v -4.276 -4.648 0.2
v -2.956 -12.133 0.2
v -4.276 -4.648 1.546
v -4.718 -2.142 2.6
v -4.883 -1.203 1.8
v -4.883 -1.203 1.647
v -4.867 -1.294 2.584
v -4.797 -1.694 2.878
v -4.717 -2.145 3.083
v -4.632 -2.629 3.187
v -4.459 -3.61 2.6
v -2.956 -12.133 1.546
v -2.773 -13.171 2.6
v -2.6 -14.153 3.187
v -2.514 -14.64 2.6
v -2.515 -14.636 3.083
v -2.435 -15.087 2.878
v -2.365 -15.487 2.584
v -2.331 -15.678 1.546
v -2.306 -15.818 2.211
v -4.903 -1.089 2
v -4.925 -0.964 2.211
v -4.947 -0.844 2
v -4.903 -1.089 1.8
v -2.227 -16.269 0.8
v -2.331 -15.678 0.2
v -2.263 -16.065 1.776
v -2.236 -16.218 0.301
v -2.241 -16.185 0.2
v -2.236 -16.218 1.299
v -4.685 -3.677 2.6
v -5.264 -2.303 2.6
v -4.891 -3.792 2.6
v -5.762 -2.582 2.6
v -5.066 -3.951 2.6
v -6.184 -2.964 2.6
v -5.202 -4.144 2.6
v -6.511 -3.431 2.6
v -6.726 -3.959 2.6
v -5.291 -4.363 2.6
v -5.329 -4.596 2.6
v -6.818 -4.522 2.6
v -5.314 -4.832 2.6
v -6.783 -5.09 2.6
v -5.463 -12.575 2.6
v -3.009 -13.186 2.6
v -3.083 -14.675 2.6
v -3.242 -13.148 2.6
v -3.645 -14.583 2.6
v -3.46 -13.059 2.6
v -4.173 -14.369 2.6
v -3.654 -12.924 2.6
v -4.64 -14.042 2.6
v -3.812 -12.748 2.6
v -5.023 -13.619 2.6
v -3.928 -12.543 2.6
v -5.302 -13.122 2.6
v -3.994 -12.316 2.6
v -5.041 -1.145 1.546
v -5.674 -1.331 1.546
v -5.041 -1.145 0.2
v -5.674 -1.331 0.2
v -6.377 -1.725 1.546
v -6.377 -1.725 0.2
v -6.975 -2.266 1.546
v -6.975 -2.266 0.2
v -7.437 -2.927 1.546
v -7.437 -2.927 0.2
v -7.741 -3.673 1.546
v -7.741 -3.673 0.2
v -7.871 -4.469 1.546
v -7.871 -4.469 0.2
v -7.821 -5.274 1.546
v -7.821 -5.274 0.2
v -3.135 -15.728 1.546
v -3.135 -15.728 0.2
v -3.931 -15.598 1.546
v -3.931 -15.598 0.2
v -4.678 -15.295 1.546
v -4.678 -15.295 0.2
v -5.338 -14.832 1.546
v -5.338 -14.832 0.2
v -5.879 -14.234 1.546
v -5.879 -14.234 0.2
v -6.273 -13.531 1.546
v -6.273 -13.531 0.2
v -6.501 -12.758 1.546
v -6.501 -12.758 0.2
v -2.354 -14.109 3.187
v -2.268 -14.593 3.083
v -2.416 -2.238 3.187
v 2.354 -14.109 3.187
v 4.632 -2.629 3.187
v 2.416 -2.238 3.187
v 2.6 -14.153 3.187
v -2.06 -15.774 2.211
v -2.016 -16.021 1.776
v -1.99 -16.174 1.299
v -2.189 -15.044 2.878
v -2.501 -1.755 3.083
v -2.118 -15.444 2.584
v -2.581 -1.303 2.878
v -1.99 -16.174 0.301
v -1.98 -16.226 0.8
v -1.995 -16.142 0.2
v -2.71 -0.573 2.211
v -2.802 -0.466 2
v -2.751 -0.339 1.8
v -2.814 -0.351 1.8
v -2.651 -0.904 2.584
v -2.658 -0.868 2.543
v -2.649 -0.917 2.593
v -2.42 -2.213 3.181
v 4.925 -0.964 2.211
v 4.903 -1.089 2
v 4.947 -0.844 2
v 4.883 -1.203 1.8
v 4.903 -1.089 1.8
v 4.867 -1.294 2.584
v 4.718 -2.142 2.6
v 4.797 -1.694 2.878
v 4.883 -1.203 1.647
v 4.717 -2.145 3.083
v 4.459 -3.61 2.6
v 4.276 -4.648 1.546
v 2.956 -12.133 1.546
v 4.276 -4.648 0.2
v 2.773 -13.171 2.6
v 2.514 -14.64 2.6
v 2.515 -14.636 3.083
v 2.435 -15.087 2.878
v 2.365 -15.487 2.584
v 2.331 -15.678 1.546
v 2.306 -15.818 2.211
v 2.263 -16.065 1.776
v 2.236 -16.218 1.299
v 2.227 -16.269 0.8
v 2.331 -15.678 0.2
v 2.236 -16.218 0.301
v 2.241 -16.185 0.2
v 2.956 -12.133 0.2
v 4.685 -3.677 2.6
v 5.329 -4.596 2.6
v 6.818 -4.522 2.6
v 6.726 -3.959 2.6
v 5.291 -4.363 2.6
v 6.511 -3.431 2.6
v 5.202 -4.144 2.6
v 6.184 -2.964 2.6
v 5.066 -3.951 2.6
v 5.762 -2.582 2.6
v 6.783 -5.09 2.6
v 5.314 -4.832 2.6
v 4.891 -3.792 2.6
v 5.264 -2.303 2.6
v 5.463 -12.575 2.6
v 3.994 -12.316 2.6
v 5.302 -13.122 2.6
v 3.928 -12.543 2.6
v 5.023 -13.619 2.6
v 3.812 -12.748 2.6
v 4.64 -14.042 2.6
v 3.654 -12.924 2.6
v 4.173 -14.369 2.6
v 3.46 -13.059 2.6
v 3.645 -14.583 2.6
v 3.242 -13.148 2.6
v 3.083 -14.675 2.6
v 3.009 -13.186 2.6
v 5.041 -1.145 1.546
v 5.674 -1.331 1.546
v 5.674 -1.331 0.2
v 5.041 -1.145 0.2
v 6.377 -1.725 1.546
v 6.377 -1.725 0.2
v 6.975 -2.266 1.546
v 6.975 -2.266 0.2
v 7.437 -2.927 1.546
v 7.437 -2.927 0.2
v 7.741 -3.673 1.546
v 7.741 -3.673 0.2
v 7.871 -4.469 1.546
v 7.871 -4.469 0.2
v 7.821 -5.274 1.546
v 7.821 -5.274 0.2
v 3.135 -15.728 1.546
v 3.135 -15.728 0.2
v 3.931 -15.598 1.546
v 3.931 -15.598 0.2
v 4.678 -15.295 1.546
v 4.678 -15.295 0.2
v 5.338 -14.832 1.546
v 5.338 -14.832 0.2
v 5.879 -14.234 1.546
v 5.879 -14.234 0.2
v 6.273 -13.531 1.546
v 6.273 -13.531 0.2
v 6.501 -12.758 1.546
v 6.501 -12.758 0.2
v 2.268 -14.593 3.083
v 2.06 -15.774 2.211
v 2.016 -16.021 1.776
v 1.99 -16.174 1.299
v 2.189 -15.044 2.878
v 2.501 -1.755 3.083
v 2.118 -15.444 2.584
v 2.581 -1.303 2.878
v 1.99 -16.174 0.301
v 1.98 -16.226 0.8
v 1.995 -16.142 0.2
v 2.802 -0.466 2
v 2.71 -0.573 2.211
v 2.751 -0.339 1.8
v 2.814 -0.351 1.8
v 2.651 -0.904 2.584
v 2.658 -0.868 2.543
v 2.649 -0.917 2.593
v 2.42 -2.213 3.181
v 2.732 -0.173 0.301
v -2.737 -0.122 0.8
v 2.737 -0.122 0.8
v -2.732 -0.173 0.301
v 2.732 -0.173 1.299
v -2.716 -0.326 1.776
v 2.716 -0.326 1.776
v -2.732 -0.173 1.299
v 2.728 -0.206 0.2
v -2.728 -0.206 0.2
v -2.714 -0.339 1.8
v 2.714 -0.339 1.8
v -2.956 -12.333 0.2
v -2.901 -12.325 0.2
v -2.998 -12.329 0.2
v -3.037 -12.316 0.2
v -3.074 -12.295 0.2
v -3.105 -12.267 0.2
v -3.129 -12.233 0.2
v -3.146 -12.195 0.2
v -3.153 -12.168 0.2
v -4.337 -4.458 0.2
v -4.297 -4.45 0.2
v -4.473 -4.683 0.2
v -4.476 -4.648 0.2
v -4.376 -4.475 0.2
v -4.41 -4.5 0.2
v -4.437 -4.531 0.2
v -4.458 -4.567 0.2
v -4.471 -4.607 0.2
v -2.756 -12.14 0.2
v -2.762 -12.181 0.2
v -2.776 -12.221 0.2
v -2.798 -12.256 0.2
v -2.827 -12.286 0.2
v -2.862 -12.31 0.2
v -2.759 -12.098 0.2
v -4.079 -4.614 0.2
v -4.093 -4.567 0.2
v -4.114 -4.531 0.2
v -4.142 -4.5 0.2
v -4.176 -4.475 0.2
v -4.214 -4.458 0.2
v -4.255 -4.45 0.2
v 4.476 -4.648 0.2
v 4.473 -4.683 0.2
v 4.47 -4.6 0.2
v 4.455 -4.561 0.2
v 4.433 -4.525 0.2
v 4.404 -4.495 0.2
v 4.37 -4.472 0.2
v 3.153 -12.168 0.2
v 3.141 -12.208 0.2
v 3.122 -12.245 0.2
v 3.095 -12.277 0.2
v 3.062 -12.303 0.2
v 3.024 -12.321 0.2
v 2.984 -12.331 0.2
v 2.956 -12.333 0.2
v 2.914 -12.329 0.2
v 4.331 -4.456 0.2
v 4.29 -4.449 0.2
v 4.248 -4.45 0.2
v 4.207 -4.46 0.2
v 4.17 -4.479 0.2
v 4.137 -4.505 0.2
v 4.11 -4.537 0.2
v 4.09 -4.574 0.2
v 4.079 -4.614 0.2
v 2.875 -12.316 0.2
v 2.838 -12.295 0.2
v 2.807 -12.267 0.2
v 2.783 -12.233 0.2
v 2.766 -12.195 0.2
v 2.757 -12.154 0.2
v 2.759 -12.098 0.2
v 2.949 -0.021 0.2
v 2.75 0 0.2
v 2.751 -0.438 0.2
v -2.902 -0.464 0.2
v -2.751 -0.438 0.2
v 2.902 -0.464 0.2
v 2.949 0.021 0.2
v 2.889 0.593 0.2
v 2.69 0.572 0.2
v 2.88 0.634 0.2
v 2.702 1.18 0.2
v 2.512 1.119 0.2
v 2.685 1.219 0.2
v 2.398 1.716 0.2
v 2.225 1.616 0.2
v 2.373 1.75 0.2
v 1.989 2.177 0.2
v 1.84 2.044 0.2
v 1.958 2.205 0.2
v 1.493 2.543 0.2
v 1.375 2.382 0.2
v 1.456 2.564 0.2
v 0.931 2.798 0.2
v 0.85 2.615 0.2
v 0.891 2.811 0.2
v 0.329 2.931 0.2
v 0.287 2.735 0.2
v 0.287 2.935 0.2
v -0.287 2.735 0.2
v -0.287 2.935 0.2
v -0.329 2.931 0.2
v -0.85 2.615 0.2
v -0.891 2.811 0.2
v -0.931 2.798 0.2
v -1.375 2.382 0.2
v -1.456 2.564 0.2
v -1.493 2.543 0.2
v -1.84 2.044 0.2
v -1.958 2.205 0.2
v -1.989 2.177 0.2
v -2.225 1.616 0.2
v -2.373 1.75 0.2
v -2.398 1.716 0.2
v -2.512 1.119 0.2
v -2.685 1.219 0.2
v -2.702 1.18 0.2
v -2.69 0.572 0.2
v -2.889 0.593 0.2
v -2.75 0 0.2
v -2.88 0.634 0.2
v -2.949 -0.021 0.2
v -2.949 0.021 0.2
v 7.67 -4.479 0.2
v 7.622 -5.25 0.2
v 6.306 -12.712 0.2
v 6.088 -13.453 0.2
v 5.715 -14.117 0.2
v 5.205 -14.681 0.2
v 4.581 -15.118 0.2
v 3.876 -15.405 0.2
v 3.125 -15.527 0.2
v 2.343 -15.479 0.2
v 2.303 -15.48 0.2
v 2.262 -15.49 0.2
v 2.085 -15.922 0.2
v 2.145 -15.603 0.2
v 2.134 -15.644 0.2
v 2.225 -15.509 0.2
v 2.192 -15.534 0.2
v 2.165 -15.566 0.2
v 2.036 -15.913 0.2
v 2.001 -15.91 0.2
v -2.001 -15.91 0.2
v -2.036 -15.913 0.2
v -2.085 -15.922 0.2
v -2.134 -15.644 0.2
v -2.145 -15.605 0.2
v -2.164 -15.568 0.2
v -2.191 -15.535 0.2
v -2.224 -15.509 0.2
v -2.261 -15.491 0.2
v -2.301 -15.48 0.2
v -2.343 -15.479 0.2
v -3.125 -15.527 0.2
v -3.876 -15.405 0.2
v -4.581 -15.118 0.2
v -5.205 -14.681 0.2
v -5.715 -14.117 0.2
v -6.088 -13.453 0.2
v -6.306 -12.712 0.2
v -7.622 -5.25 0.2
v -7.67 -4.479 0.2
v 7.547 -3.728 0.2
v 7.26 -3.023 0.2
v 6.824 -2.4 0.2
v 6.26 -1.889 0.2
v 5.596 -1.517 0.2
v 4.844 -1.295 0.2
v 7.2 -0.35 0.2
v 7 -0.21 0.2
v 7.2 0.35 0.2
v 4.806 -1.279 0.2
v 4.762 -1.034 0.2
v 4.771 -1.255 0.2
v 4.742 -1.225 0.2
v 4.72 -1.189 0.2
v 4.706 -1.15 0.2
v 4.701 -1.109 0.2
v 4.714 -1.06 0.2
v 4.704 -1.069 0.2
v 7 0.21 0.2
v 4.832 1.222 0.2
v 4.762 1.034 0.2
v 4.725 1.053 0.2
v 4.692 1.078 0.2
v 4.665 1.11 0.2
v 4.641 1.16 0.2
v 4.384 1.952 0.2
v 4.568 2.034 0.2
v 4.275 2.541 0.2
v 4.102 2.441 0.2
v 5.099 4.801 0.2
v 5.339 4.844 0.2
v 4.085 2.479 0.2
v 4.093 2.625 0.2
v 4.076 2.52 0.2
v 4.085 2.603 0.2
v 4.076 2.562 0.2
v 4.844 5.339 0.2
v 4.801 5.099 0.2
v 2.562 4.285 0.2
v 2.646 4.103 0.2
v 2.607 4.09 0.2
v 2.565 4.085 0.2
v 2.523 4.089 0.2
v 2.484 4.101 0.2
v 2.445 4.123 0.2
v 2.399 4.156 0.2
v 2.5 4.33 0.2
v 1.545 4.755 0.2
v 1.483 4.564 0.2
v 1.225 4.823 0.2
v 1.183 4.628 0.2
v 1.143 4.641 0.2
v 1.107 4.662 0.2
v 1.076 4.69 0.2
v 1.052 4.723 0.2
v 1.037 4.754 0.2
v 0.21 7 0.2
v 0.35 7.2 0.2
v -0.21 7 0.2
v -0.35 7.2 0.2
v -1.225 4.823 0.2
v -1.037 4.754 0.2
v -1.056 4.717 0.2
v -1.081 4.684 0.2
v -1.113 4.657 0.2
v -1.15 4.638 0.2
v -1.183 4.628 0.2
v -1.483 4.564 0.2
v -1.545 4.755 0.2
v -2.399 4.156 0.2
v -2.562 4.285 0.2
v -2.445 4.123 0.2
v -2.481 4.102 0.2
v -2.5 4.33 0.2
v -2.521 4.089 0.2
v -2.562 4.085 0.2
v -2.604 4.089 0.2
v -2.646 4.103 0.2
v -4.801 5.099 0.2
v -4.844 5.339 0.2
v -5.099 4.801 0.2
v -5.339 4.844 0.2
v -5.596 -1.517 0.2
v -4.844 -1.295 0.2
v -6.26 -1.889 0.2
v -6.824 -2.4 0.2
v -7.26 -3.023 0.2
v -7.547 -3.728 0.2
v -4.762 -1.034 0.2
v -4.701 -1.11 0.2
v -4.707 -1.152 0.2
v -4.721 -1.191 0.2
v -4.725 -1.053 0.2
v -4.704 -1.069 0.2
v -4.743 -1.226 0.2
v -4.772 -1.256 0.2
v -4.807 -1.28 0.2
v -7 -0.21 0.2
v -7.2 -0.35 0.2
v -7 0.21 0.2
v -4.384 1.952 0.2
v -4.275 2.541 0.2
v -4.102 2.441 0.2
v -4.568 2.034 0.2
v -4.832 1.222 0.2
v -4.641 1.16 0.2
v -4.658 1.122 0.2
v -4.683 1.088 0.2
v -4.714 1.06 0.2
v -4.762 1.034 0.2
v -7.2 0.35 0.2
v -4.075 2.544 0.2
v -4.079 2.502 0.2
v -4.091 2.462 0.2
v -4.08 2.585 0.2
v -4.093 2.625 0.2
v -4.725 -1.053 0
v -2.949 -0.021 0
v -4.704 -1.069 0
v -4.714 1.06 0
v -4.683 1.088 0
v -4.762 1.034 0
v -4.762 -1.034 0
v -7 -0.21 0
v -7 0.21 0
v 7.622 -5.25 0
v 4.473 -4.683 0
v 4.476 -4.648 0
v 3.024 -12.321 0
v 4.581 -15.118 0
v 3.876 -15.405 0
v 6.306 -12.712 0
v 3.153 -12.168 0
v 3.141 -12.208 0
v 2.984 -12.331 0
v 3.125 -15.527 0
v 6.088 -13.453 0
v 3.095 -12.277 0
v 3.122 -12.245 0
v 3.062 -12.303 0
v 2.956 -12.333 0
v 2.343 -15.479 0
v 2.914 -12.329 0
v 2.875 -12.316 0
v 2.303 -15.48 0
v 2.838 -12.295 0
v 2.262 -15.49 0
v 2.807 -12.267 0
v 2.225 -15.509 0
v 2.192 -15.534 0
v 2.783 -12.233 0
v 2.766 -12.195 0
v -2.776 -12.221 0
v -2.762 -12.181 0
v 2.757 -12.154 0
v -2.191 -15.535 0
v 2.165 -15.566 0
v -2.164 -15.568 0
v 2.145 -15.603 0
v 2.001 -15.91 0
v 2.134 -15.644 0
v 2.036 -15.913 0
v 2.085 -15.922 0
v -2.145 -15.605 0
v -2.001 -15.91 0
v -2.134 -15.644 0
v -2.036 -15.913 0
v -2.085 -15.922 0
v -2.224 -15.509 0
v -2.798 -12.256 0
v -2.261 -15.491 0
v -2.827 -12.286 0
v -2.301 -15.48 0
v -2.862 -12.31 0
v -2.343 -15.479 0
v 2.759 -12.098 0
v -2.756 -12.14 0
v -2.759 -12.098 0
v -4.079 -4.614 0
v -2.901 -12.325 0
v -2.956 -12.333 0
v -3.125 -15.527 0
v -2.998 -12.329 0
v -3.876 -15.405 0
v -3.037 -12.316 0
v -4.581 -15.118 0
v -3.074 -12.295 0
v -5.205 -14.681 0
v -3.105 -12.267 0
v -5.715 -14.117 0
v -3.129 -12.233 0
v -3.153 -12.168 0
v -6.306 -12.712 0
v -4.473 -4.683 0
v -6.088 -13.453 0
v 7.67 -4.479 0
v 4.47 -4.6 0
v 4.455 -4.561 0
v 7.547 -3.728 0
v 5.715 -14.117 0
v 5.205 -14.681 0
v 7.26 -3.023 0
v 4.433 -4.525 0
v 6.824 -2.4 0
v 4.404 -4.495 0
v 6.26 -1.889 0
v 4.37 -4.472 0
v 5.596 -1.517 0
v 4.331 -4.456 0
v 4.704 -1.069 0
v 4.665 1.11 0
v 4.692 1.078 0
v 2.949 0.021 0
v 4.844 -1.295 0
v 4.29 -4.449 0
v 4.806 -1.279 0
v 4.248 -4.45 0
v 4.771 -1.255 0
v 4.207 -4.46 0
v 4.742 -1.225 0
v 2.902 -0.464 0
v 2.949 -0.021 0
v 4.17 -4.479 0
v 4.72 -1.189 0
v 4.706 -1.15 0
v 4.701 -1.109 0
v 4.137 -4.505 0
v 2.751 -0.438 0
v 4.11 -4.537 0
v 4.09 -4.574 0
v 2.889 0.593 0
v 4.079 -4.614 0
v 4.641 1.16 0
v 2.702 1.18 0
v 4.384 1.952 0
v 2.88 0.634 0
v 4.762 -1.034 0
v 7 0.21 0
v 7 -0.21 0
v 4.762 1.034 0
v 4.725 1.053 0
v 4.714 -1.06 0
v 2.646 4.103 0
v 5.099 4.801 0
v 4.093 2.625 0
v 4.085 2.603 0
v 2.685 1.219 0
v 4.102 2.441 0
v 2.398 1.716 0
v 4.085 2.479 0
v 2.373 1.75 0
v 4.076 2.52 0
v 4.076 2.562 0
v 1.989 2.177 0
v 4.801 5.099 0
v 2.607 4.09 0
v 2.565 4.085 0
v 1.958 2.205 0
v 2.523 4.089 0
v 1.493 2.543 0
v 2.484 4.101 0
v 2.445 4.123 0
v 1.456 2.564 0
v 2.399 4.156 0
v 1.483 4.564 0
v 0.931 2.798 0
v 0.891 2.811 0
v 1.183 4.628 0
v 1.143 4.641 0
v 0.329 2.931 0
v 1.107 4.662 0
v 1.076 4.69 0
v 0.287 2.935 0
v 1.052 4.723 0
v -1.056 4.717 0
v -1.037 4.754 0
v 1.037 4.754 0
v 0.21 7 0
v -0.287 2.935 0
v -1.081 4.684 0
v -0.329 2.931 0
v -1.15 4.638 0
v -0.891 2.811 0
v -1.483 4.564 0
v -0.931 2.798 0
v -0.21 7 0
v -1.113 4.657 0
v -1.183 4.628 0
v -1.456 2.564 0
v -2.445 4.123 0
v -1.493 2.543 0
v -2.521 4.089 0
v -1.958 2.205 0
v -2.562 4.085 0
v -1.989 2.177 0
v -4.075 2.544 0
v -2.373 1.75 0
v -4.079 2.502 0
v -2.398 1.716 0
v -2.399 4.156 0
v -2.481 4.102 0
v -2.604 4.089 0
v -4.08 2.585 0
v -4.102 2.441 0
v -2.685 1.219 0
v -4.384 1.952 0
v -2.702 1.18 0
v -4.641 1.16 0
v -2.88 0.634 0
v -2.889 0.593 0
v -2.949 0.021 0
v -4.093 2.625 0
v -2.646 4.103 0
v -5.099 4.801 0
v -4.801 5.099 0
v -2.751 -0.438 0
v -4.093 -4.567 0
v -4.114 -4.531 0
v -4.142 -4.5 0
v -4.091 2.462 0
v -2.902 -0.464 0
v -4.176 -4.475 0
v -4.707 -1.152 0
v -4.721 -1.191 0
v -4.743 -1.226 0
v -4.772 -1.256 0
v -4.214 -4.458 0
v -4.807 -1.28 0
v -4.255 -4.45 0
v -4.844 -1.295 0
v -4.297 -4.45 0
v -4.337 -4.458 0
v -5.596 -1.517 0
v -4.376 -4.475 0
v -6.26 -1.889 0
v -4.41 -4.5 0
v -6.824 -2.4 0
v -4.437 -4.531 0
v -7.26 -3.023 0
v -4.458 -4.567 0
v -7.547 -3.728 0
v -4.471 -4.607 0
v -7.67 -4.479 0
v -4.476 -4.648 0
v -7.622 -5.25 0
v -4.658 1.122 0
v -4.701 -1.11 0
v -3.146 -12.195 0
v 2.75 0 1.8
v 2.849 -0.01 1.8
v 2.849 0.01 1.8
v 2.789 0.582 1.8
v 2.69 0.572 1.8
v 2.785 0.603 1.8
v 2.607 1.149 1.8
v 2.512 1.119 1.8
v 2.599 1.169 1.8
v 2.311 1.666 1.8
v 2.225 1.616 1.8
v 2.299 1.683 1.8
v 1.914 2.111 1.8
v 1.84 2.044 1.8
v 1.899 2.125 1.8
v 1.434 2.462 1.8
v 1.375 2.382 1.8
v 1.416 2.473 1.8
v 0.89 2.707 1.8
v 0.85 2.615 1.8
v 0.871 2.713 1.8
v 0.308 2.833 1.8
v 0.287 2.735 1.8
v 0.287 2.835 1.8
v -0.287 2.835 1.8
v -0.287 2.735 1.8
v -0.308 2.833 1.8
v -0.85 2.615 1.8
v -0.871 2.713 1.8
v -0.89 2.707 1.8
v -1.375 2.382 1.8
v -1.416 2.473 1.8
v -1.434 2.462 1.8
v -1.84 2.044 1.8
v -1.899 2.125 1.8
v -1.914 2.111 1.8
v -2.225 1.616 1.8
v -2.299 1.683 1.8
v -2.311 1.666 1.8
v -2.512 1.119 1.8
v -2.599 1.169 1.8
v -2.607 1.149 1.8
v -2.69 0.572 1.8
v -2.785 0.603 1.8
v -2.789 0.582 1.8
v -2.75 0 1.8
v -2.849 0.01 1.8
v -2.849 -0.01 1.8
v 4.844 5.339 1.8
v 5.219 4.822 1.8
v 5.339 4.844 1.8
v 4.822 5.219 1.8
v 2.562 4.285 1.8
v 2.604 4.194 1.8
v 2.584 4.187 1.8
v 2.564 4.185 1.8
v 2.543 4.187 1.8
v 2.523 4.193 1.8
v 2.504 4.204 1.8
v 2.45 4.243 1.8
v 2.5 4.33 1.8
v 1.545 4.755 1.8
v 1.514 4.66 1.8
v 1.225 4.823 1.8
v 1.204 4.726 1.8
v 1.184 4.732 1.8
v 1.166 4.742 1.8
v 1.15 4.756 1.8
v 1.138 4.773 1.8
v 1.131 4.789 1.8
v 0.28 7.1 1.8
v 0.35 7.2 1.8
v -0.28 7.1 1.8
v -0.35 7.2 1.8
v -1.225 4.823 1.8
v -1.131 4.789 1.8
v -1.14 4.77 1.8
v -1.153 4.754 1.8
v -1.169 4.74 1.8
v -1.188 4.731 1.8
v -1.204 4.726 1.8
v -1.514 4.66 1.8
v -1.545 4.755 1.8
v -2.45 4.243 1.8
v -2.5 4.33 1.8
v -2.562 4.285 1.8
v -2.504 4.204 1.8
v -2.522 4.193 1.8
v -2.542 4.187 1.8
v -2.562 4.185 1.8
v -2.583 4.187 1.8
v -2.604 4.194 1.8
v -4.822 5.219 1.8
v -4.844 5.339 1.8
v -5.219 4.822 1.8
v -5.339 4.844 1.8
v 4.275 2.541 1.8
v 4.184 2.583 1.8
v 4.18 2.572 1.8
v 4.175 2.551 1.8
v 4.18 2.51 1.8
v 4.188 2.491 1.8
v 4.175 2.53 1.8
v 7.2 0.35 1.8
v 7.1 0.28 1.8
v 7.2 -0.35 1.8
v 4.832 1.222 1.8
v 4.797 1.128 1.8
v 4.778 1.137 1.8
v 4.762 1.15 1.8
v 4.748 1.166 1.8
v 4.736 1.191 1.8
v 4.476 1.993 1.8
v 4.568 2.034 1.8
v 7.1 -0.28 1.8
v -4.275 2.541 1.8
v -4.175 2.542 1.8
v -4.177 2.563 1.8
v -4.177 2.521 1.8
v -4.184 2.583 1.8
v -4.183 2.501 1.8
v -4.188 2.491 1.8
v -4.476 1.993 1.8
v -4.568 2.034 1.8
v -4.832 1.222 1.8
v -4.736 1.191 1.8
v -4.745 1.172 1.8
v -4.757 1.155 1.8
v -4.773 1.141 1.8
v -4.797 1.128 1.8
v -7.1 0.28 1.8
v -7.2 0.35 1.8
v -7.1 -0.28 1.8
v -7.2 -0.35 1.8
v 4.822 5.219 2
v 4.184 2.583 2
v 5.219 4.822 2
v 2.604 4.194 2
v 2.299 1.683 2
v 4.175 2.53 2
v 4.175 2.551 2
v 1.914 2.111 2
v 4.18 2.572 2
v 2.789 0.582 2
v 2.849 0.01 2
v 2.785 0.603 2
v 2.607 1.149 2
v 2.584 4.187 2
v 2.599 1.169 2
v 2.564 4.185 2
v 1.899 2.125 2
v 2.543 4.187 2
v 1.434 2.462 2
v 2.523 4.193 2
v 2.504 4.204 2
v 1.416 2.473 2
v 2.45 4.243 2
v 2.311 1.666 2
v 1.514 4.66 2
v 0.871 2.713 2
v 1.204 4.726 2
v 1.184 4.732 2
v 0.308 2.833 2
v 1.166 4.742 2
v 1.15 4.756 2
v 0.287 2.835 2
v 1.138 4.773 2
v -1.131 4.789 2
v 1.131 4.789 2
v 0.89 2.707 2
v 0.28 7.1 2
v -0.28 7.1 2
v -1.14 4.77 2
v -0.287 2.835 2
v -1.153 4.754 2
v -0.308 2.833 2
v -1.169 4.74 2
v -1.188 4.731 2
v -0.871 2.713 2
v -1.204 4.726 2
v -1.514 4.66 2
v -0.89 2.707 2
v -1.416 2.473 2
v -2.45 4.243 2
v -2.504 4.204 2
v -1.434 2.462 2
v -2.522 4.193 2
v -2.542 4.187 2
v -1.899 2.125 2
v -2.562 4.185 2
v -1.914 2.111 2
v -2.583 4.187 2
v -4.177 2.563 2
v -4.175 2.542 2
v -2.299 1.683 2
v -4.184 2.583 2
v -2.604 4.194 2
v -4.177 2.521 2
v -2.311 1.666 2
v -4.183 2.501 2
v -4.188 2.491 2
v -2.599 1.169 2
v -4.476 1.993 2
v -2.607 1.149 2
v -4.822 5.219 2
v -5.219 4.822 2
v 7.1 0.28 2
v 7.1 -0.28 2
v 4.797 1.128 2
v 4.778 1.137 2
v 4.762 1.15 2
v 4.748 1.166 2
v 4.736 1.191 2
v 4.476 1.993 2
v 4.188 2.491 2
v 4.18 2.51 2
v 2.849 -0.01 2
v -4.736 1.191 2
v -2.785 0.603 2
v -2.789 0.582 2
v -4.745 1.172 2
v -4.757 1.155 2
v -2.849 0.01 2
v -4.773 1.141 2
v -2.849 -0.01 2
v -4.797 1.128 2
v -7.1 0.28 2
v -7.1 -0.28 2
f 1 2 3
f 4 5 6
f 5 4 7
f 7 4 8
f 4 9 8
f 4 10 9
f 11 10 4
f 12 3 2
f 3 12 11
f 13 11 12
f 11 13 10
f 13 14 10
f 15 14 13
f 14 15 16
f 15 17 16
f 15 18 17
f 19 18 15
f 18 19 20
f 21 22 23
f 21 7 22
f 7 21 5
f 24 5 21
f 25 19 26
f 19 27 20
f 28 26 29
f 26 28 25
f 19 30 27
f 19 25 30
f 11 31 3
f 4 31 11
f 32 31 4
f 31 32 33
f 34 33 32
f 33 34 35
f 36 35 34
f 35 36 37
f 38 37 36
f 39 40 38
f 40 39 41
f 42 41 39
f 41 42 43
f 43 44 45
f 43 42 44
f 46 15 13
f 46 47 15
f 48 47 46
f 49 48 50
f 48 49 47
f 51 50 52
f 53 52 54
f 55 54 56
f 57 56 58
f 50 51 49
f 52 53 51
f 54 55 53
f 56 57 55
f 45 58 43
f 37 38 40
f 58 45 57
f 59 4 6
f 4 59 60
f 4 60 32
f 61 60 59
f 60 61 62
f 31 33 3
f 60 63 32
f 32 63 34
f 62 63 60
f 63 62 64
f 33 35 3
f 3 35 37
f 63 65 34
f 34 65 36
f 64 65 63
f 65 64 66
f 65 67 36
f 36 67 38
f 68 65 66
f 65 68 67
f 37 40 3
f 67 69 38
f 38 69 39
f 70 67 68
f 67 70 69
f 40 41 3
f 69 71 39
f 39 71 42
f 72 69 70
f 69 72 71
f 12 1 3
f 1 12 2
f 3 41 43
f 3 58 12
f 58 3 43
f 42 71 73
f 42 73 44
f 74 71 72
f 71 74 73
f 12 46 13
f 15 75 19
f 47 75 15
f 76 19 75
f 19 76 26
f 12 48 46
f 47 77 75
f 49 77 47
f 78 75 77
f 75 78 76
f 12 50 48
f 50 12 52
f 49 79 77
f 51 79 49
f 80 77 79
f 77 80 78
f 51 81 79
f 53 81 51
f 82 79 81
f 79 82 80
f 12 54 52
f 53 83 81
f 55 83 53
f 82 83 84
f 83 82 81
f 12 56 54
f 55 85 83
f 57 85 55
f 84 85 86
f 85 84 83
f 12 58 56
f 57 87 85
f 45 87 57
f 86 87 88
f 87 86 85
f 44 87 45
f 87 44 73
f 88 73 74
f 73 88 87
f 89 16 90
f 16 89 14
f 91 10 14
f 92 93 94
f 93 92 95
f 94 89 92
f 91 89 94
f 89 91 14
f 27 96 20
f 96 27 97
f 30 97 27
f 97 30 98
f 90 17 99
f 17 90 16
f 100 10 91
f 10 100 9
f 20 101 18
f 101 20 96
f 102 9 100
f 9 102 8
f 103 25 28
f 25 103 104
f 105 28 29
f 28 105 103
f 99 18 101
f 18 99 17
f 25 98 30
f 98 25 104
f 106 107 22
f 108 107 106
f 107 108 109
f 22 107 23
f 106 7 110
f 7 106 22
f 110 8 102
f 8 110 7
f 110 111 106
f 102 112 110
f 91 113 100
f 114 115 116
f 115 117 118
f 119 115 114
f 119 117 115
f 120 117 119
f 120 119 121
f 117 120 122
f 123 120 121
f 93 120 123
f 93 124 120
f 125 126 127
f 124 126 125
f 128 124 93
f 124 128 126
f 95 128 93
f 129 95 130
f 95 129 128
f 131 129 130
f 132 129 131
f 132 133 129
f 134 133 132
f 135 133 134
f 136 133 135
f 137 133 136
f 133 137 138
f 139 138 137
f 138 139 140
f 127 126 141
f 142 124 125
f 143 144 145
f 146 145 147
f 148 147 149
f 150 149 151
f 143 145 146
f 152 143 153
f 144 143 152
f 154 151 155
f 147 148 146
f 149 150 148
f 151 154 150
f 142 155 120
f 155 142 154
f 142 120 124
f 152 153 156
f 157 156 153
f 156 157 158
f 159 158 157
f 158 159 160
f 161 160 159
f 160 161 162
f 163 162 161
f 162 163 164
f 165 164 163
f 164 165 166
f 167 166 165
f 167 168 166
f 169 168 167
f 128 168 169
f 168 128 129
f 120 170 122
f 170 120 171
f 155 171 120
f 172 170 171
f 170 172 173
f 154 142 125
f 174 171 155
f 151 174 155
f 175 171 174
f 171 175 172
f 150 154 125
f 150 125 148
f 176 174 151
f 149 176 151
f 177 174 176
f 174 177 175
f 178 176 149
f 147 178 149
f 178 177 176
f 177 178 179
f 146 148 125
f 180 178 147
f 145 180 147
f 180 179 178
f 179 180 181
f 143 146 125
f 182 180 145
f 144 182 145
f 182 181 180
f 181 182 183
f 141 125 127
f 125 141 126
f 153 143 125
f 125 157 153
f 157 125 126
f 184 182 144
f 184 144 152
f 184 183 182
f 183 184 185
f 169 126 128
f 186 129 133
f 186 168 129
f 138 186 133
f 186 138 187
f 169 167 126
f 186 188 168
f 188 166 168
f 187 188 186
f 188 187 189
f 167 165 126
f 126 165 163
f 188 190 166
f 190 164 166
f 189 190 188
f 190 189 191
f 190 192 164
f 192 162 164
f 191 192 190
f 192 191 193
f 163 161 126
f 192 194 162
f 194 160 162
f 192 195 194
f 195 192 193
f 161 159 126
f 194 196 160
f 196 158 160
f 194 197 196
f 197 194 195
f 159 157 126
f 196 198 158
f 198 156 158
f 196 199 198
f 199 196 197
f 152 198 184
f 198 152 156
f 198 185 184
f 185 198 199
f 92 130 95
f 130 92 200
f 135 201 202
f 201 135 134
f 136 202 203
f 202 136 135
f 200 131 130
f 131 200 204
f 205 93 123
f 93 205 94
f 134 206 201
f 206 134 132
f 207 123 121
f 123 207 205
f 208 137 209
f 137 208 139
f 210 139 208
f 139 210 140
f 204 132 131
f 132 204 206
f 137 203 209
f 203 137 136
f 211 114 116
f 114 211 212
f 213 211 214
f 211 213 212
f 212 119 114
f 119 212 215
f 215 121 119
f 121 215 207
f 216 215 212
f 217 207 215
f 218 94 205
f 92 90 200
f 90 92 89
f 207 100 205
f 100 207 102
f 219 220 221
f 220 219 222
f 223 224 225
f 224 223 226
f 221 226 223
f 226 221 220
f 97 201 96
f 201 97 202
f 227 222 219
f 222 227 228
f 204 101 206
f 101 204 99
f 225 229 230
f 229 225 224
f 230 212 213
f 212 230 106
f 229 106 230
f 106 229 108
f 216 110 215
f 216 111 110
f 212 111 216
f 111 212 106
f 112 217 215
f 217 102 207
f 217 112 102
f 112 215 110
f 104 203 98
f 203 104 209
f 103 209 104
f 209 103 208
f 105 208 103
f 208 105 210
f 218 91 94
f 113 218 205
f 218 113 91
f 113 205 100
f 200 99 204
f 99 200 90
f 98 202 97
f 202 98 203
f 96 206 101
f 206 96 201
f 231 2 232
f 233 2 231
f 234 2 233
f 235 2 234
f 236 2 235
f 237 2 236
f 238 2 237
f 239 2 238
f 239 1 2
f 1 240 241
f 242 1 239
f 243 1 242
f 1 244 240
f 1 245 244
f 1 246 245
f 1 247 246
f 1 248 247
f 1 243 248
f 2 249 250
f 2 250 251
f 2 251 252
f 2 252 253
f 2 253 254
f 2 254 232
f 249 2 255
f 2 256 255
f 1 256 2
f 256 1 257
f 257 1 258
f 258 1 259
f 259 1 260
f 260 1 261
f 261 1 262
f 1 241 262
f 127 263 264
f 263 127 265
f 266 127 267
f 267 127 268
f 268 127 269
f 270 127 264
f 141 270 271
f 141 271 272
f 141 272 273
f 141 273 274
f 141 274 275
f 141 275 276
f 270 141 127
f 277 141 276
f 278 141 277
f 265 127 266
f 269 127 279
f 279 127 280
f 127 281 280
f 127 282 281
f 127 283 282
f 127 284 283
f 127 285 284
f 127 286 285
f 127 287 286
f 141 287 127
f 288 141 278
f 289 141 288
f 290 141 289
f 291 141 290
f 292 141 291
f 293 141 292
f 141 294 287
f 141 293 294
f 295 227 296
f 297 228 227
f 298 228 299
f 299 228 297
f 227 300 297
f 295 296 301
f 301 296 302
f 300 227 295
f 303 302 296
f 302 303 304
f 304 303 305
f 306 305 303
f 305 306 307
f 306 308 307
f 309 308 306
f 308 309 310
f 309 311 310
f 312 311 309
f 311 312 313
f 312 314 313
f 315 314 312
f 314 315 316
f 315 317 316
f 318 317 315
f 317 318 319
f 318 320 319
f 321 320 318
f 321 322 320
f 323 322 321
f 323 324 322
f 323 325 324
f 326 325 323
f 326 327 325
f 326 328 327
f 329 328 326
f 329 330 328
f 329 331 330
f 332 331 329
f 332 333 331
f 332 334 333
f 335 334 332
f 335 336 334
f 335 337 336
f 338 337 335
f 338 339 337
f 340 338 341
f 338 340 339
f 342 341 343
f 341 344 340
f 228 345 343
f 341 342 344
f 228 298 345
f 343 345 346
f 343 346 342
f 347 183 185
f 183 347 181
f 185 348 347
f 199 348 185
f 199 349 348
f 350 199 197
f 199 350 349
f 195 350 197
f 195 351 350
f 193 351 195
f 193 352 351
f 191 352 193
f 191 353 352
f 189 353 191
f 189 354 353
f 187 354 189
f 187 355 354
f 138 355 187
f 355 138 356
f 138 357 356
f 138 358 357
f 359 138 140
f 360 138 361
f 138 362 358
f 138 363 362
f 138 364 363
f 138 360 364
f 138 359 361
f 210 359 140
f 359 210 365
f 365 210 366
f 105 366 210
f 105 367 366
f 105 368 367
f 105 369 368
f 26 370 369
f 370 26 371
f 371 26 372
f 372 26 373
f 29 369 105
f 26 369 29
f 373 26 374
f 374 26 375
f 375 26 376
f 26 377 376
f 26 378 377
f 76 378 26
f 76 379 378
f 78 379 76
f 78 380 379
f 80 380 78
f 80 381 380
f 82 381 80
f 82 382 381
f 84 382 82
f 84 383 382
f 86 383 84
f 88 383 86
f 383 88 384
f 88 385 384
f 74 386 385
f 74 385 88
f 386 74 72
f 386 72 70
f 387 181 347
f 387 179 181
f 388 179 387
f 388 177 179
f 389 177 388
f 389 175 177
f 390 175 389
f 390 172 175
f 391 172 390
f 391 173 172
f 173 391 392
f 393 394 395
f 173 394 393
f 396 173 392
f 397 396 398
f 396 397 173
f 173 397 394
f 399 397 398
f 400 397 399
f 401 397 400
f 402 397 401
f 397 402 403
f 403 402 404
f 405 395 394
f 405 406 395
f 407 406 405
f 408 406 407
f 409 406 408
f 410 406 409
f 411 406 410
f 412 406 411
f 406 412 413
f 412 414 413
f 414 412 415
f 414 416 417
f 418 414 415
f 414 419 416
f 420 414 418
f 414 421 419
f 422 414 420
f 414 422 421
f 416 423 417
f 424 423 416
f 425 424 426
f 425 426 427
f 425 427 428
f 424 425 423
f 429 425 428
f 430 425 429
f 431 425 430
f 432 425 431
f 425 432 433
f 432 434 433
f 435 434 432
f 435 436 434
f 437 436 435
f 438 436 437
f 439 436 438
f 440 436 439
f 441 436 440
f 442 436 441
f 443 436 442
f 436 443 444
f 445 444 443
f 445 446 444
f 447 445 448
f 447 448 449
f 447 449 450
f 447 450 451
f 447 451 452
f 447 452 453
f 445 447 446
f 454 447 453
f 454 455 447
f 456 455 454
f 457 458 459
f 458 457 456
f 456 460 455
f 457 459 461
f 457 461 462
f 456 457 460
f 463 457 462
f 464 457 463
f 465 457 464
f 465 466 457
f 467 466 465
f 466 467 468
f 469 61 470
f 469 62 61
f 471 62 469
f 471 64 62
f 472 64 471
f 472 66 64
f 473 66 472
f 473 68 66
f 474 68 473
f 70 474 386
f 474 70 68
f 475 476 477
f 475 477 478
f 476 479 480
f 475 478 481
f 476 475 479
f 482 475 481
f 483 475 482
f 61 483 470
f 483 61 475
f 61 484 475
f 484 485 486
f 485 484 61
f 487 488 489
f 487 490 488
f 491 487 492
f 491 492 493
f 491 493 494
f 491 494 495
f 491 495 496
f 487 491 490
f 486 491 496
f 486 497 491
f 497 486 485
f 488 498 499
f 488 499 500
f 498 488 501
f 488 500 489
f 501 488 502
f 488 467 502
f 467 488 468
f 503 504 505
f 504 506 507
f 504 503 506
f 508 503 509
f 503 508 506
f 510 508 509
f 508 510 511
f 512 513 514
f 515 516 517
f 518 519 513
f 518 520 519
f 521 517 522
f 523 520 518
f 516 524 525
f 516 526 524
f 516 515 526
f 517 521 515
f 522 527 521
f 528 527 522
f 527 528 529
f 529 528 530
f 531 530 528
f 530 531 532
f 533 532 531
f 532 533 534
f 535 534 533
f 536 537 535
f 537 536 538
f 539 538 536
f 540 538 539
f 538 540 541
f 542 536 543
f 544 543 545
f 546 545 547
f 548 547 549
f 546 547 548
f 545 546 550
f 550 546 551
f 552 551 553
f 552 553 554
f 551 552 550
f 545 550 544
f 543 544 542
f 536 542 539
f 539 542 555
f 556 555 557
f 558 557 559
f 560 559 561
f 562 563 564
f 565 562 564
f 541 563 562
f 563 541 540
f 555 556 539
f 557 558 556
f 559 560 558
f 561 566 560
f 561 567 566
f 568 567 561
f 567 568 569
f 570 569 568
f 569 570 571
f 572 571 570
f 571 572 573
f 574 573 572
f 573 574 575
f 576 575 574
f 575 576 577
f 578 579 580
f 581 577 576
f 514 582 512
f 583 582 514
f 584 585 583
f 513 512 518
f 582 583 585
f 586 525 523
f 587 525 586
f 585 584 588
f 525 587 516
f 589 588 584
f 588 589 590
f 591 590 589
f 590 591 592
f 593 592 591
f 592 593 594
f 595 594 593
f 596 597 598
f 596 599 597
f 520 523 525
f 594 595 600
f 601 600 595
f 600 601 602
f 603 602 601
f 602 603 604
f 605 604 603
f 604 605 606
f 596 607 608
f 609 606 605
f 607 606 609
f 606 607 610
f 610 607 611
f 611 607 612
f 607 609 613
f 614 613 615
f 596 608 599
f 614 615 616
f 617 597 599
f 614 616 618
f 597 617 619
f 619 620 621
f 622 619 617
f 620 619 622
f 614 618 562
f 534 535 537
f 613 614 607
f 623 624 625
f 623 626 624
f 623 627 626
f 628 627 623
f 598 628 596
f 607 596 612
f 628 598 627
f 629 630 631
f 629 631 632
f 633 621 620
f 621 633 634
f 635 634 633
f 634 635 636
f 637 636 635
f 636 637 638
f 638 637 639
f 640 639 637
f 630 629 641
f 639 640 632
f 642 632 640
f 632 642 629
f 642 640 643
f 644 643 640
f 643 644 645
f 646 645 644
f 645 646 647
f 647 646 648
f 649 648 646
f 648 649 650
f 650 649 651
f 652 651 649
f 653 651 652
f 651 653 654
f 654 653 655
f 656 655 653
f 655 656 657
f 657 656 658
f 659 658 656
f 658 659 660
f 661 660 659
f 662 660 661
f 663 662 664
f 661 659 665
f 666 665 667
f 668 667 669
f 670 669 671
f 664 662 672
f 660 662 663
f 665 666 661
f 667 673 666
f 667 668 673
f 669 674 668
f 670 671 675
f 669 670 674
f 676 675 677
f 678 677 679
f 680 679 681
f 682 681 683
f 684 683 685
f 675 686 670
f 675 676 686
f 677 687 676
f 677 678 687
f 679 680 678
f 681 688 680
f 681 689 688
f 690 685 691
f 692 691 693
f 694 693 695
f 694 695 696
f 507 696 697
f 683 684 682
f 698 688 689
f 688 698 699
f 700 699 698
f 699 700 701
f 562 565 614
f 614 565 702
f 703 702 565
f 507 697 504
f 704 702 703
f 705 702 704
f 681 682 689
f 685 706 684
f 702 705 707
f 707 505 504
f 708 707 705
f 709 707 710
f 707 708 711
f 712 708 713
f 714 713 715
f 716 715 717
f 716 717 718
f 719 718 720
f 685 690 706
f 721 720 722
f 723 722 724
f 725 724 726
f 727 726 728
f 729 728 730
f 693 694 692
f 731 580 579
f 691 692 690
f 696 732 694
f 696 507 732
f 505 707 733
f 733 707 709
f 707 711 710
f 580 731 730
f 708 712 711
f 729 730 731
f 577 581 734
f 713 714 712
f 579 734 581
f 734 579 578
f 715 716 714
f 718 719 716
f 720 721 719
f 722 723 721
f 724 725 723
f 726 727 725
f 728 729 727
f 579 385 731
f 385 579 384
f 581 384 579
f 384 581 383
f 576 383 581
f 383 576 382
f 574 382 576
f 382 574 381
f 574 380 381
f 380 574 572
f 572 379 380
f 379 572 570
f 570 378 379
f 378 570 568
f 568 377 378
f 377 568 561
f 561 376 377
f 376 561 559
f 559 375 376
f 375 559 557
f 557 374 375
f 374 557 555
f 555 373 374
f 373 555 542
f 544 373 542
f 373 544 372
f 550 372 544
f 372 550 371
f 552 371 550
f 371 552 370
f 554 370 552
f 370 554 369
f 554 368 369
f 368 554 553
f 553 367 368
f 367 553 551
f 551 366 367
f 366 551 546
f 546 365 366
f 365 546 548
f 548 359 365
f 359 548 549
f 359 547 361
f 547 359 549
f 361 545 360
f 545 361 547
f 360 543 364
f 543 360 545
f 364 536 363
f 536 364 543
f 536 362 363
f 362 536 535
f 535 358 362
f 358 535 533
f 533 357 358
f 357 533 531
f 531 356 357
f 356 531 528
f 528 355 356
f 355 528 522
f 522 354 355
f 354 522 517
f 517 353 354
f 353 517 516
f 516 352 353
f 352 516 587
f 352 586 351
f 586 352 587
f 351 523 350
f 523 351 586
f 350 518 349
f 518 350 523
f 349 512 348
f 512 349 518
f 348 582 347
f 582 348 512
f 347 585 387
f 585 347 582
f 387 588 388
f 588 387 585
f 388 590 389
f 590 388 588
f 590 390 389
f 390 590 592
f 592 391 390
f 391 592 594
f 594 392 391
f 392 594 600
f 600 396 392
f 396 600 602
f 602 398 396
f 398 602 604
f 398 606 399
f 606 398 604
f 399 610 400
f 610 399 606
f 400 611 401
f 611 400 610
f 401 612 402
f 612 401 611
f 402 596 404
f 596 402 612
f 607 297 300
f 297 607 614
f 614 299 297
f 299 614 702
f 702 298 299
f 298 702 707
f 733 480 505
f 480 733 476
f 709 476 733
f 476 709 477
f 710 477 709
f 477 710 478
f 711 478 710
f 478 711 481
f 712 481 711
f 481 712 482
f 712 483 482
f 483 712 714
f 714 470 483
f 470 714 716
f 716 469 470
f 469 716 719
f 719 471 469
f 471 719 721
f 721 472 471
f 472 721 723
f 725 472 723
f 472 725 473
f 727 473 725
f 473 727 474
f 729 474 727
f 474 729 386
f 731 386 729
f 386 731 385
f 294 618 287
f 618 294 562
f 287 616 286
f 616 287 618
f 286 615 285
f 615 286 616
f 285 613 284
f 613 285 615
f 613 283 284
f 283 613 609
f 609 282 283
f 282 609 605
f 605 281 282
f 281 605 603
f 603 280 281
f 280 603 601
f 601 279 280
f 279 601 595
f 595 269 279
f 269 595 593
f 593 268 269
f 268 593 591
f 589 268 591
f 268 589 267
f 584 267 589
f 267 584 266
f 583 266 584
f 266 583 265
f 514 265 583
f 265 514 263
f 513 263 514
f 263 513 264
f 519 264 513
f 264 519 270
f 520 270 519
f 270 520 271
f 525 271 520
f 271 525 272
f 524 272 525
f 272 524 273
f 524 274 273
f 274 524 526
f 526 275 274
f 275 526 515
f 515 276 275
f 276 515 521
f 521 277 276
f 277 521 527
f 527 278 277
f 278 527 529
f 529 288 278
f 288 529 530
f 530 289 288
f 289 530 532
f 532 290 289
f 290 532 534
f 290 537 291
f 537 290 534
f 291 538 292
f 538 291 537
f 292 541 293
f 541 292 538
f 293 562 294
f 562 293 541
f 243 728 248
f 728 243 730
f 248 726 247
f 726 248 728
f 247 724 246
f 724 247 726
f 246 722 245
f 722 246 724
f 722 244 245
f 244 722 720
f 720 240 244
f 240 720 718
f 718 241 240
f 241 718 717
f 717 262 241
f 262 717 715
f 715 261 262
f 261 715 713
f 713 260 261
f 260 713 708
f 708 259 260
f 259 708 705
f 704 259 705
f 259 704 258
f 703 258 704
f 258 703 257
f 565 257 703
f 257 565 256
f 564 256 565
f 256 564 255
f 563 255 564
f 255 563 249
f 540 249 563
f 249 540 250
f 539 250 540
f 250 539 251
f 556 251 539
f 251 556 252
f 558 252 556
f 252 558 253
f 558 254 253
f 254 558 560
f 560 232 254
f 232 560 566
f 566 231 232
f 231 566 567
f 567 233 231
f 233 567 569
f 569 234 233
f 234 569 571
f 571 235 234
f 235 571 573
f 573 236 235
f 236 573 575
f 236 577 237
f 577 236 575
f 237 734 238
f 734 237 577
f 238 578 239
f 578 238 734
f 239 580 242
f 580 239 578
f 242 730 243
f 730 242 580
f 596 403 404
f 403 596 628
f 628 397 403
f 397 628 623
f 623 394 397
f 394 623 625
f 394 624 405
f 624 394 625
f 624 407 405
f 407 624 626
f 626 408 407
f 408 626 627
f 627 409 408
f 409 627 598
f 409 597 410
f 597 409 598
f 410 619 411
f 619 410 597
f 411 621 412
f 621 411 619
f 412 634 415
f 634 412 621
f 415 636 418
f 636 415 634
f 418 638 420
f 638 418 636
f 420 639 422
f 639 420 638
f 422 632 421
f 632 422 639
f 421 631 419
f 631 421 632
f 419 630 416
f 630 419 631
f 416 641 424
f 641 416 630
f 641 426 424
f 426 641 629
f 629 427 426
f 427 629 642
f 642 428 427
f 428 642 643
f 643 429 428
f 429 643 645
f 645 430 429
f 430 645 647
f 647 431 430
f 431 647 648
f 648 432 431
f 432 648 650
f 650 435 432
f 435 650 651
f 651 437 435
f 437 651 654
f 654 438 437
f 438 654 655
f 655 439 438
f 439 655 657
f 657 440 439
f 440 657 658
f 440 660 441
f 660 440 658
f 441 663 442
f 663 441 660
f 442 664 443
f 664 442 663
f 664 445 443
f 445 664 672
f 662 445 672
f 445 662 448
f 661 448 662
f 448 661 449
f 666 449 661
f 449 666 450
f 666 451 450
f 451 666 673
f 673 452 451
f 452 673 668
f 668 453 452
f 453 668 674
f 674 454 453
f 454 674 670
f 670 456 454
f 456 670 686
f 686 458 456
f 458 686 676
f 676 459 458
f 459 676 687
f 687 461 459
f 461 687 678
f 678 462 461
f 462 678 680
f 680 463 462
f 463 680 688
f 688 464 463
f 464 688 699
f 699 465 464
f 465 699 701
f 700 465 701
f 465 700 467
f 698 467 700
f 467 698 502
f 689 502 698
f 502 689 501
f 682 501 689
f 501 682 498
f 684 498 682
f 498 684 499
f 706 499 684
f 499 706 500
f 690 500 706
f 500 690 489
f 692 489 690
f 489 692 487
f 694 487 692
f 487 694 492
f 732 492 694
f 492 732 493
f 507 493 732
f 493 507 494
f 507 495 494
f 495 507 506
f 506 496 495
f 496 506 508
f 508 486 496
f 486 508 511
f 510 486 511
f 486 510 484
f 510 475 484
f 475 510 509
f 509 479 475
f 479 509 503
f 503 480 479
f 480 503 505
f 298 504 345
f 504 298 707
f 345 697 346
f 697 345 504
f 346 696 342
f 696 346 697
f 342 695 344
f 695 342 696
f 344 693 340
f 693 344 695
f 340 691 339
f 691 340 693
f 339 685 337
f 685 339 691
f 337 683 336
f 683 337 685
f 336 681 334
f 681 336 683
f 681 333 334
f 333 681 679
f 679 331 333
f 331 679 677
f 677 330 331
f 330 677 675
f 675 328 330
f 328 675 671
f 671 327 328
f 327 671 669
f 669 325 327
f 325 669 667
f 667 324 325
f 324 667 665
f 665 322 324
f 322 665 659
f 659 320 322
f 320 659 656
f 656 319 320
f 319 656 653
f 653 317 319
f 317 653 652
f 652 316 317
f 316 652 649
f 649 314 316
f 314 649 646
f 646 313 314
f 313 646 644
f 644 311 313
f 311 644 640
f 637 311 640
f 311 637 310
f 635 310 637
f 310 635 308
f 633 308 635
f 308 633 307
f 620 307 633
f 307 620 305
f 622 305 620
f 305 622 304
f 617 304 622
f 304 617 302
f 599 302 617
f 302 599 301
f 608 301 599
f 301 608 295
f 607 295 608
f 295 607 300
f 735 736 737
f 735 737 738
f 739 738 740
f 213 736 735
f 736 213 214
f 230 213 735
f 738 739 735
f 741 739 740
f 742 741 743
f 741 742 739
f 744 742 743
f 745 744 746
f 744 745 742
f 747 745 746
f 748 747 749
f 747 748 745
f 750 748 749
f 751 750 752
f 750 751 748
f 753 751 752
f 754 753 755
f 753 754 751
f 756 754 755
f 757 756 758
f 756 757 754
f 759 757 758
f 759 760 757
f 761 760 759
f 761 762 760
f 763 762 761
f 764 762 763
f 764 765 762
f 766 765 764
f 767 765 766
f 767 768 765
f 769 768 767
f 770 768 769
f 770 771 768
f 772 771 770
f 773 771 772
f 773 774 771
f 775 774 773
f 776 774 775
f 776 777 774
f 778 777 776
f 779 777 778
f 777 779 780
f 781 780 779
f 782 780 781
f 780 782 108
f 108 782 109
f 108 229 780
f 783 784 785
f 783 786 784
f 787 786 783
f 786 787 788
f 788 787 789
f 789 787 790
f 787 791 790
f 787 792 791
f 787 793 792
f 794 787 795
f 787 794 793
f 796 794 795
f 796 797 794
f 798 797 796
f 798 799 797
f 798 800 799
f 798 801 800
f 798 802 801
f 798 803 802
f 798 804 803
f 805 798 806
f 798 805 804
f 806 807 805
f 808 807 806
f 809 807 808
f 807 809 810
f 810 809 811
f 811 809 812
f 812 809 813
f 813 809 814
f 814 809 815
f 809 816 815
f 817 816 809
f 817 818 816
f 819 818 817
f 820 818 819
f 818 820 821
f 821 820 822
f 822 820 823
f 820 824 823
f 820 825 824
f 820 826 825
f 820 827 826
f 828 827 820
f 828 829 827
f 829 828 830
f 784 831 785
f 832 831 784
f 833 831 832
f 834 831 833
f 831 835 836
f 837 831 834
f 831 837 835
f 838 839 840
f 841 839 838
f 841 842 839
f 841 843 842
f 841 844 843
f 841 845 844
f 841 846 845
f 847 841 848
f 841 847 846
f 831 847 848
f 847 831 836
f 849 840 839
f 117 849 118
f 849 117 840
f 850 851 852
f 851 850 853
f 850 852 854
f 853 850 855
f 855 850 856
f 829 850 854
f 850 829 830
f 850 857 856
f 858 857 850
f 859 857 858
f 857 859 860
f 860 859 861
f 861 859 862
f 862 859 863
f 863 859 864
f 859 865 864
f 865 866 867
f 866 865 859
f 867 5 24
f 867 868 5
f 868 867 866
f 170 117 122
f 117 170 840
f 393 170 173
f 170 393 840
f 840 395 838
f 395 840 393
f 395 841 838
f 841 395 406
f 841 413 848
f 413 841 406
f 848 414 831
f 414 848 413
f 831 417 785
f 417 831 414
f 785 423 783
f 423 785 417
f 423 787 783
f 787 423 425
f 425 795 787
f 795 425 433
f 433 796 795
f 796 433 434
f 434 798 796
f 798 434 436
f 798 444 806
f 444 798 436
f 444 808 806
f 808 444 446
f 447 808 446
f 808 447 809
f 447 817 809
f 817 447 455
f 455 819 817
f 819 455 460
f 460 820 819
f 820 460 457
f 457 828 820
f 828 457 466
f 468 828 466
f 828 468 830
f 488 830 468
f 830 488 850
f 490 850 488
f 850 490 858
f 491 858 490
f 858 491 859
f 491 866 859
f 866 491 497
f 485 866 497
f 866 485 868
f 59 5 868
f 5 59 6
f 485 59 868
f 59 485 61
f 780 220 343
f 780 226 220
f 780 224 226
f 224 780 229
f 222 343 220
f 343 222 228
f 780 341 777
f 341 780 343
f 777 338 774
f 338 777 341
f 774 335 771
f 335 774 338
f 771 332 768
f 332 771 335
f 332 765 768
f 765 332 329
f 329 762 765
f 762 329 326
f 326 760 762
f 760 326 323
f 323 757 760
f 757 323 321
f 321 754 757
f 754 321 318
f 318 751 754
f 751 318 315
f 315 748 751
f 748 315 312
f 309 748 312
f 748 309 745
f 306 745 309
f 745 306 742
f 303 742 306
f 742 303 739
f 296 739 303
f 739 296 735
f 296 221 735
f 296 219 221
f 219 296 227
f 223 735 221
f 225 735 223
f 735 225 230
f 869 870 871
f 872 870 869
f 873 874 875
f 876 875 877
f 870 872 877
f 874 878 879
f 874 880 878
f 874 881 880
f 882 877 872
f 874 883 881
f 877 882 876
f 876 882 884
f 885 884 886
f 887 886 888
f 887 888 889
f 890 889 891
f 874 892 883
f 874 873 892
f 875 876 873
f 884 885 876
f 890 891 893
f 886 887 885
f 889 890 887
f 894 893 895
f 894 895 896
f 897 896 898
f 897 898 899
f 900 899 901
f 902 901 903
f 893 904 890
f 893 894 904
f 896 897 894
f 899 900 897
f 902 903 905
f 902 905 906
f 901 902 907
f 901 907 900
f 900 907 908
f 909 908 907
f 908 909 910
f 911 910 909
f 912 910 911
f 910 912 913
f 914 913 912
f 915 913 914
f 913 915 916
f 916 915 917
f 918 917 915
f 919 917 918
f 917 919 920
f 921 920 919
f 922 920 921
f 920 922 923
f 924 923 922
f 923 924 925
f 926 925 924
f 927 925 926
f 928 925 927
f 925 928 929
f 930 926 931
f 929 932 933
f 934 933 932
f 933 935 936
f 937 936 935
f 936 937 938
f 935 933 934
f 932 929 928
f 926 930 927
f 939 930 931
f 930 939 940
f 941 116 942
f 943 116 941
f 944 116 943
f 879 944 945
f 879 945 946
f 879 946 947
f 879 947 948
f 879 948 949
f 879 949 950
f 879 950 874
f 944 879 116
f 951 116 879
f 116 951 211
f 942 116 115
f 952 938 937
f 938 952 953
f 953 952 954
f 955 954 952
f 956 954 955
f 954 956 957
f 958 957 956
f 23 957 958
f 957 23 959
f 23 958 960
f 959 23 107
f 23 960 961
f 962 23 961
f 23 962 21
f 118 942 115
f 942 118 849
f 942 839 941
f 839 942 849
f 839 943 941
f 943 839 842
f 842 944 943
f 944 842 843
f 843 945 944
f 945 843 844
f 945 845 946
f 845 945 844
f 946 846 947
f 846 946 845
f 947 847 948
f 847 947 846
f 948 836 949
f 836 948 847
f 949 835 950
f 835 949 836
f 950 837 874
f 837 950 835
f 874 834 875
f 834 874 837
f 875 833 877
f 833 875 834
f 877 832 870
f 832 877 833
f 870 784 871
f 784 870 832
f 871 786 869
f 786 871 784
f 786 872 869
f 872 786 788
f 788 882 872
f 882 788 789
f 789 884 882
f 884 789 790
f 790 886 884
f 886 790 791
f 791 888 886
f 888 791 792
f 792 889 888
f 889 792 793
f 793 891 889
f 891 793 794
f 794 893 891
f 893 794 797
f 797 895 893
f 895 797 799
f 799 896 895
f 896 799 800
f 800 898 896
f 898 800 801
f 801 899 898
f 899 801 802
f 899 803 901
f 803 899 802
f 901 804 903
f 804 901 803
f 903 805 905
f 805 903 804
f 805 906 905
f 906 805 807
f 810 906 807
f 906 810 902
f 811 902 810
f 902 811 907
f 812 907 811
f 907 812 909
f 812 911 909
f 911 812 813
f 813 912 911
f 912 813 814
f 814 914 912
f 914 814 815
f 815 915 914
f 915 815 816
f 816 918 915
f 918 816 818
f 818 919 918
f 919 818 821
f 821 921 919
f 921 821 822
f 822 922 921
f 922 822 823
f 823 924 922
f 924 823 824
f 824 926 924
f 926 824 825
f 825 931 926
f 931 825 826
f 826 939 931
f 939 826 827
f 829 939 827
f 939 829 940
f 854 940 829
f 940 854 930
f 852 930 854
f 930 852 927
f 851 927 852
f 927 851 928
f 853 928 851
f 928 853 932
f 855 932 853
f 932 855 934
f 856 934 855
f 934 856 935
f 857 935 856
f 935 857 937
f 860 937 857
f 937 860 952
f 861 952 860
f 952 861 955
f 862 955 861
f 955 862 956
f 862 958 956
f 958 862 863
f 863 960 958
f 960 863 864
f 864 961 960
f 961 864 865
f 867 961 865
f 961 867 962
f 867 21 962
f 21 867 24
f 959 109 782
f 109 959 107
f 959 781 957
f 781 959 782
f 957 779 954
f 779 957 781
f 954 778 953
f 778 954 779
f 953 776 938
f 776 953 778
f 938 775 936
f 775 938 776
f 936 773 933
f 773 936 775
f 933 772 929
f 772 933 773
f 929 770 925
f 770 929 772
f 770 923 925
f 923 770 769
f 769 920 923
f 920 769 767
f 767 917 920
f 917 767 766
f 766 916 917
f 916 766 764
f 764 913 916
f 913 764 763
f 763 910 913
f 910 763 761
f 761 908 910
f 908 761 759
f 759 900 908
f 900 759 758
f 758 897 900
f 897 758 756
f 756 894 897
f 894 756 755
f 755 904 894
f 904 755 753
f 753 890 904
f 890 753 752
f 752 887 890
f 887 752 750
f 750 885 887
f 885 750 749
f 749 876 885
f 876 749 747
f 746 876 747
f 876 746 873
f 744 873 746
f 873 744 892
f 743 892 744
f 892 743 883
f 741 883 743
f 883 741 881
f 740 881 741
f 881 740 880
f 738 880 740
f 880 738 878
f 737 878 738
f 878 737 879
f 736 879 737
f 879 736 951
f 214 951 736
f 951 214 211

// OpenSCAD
// file: backpack.scad
width = 4.5;
depth = 2.4;
height = 16;
$fn = 30;

inset = 0.6;
pipe_radius = depth - inset;

module middle() {
  rotate([90, 0, 0]) {
    hull()
      for (x = [depth, height-depth])
        translate([x, 0, 0])
          cylinder(h=width, r=depth);
  }
}

module octagon() {
  intersection_for(a = [0, 45])
    rotate([0, 0, a])
      square(pipe_radius*2, center=true);
}

module elbow() {
  rotate_extrude(angle = 90)
    translate([pipe_radius, 0])
      octagon();
}

module pipe_pack() {
  translate([-height/2, width/2, 0])
    middle();
  
  for (a = [-1, 1]) {
    scale([1, a]) {
      for (b = [-1, 1])
        scale([b, 1])
          translate([height/2 - pipe_radius - depth, width/2, 0])
            elbow();
      translate([-height/2 + pipe_radius + depth, width/2 + pipe_radius, 0])
        rotate([0, 90, 0])
          linear_extrude(height - 2*pipe_radius - 2*depth)
            octagon();
    }
  }
}

module tilted_pack() {
  for (a = [-1, 1]) {
    scale([1, a]) {
      translate([0, 1.4]) {
        rotate([0, 0, -10]) {
          intersection() {
            pipe_pack();
            translate([0, 50, 0])
              cube(100, center=true);
          }
        }
      }
    }
  }
  hull() {
    for (a = [-1, 1]) {
      scale([1, a]) {
        translate([0, 1.4]) {
          rotate([0, 0, -10]) {
            intersection() {
              pipe_pack();
              translate([0, 1, 0])
                cube([100, 2, 100], center=true);
            }
          }
        }
      }
    }
  }
}

module half() {
  difference() {
    translate([0, 0, 0.8])
      tilted_pack();
    translate([0, 0, -500])
      cube(1000, center=true);
  }
}

module print() {
  linear_extrude(0.2)
    offset(-0.2)
      projection(cut = true)
        translate([0, 0, -0.1])
          half();
  intersection() {
    half();
    translate([0, 0, 500.2])
      cube(1000, center=true);
  }
}

print();
// main file
use <backpack.scad>

width = 14;
height = 2;
points = 2;
$fn = 30;
eps = 0.0001;

module profile() {
  difference() {
    union() {
      circle(d = width - 2*points);
      for (a = [-90, -45, 0, 45, 90]) {
        rotate([0, 0, a]) {
          hull() {
            square([6, eps], center=true);
            translate([0, width/2])
              square([0.7, 0.4], center=true);
          }
        }
      }
      hull() {
        circle(d=6);
        translate([0, -9])
          circle(d=6);
      }
    }
    circle(d=5.5);
  }
}

linear_extrude(0.2)
  offset(-0.2)
    profile();
translate([0, 0, 0.2])
  linear_extrude(height - 0.4)
    profile();
translate([0, 0, height - 0.2])
  linear_extrude(0.2)
    offset(-0.1)
      profile();

translate([0, -8])
  rotate([0, 0, -90])
    print();
